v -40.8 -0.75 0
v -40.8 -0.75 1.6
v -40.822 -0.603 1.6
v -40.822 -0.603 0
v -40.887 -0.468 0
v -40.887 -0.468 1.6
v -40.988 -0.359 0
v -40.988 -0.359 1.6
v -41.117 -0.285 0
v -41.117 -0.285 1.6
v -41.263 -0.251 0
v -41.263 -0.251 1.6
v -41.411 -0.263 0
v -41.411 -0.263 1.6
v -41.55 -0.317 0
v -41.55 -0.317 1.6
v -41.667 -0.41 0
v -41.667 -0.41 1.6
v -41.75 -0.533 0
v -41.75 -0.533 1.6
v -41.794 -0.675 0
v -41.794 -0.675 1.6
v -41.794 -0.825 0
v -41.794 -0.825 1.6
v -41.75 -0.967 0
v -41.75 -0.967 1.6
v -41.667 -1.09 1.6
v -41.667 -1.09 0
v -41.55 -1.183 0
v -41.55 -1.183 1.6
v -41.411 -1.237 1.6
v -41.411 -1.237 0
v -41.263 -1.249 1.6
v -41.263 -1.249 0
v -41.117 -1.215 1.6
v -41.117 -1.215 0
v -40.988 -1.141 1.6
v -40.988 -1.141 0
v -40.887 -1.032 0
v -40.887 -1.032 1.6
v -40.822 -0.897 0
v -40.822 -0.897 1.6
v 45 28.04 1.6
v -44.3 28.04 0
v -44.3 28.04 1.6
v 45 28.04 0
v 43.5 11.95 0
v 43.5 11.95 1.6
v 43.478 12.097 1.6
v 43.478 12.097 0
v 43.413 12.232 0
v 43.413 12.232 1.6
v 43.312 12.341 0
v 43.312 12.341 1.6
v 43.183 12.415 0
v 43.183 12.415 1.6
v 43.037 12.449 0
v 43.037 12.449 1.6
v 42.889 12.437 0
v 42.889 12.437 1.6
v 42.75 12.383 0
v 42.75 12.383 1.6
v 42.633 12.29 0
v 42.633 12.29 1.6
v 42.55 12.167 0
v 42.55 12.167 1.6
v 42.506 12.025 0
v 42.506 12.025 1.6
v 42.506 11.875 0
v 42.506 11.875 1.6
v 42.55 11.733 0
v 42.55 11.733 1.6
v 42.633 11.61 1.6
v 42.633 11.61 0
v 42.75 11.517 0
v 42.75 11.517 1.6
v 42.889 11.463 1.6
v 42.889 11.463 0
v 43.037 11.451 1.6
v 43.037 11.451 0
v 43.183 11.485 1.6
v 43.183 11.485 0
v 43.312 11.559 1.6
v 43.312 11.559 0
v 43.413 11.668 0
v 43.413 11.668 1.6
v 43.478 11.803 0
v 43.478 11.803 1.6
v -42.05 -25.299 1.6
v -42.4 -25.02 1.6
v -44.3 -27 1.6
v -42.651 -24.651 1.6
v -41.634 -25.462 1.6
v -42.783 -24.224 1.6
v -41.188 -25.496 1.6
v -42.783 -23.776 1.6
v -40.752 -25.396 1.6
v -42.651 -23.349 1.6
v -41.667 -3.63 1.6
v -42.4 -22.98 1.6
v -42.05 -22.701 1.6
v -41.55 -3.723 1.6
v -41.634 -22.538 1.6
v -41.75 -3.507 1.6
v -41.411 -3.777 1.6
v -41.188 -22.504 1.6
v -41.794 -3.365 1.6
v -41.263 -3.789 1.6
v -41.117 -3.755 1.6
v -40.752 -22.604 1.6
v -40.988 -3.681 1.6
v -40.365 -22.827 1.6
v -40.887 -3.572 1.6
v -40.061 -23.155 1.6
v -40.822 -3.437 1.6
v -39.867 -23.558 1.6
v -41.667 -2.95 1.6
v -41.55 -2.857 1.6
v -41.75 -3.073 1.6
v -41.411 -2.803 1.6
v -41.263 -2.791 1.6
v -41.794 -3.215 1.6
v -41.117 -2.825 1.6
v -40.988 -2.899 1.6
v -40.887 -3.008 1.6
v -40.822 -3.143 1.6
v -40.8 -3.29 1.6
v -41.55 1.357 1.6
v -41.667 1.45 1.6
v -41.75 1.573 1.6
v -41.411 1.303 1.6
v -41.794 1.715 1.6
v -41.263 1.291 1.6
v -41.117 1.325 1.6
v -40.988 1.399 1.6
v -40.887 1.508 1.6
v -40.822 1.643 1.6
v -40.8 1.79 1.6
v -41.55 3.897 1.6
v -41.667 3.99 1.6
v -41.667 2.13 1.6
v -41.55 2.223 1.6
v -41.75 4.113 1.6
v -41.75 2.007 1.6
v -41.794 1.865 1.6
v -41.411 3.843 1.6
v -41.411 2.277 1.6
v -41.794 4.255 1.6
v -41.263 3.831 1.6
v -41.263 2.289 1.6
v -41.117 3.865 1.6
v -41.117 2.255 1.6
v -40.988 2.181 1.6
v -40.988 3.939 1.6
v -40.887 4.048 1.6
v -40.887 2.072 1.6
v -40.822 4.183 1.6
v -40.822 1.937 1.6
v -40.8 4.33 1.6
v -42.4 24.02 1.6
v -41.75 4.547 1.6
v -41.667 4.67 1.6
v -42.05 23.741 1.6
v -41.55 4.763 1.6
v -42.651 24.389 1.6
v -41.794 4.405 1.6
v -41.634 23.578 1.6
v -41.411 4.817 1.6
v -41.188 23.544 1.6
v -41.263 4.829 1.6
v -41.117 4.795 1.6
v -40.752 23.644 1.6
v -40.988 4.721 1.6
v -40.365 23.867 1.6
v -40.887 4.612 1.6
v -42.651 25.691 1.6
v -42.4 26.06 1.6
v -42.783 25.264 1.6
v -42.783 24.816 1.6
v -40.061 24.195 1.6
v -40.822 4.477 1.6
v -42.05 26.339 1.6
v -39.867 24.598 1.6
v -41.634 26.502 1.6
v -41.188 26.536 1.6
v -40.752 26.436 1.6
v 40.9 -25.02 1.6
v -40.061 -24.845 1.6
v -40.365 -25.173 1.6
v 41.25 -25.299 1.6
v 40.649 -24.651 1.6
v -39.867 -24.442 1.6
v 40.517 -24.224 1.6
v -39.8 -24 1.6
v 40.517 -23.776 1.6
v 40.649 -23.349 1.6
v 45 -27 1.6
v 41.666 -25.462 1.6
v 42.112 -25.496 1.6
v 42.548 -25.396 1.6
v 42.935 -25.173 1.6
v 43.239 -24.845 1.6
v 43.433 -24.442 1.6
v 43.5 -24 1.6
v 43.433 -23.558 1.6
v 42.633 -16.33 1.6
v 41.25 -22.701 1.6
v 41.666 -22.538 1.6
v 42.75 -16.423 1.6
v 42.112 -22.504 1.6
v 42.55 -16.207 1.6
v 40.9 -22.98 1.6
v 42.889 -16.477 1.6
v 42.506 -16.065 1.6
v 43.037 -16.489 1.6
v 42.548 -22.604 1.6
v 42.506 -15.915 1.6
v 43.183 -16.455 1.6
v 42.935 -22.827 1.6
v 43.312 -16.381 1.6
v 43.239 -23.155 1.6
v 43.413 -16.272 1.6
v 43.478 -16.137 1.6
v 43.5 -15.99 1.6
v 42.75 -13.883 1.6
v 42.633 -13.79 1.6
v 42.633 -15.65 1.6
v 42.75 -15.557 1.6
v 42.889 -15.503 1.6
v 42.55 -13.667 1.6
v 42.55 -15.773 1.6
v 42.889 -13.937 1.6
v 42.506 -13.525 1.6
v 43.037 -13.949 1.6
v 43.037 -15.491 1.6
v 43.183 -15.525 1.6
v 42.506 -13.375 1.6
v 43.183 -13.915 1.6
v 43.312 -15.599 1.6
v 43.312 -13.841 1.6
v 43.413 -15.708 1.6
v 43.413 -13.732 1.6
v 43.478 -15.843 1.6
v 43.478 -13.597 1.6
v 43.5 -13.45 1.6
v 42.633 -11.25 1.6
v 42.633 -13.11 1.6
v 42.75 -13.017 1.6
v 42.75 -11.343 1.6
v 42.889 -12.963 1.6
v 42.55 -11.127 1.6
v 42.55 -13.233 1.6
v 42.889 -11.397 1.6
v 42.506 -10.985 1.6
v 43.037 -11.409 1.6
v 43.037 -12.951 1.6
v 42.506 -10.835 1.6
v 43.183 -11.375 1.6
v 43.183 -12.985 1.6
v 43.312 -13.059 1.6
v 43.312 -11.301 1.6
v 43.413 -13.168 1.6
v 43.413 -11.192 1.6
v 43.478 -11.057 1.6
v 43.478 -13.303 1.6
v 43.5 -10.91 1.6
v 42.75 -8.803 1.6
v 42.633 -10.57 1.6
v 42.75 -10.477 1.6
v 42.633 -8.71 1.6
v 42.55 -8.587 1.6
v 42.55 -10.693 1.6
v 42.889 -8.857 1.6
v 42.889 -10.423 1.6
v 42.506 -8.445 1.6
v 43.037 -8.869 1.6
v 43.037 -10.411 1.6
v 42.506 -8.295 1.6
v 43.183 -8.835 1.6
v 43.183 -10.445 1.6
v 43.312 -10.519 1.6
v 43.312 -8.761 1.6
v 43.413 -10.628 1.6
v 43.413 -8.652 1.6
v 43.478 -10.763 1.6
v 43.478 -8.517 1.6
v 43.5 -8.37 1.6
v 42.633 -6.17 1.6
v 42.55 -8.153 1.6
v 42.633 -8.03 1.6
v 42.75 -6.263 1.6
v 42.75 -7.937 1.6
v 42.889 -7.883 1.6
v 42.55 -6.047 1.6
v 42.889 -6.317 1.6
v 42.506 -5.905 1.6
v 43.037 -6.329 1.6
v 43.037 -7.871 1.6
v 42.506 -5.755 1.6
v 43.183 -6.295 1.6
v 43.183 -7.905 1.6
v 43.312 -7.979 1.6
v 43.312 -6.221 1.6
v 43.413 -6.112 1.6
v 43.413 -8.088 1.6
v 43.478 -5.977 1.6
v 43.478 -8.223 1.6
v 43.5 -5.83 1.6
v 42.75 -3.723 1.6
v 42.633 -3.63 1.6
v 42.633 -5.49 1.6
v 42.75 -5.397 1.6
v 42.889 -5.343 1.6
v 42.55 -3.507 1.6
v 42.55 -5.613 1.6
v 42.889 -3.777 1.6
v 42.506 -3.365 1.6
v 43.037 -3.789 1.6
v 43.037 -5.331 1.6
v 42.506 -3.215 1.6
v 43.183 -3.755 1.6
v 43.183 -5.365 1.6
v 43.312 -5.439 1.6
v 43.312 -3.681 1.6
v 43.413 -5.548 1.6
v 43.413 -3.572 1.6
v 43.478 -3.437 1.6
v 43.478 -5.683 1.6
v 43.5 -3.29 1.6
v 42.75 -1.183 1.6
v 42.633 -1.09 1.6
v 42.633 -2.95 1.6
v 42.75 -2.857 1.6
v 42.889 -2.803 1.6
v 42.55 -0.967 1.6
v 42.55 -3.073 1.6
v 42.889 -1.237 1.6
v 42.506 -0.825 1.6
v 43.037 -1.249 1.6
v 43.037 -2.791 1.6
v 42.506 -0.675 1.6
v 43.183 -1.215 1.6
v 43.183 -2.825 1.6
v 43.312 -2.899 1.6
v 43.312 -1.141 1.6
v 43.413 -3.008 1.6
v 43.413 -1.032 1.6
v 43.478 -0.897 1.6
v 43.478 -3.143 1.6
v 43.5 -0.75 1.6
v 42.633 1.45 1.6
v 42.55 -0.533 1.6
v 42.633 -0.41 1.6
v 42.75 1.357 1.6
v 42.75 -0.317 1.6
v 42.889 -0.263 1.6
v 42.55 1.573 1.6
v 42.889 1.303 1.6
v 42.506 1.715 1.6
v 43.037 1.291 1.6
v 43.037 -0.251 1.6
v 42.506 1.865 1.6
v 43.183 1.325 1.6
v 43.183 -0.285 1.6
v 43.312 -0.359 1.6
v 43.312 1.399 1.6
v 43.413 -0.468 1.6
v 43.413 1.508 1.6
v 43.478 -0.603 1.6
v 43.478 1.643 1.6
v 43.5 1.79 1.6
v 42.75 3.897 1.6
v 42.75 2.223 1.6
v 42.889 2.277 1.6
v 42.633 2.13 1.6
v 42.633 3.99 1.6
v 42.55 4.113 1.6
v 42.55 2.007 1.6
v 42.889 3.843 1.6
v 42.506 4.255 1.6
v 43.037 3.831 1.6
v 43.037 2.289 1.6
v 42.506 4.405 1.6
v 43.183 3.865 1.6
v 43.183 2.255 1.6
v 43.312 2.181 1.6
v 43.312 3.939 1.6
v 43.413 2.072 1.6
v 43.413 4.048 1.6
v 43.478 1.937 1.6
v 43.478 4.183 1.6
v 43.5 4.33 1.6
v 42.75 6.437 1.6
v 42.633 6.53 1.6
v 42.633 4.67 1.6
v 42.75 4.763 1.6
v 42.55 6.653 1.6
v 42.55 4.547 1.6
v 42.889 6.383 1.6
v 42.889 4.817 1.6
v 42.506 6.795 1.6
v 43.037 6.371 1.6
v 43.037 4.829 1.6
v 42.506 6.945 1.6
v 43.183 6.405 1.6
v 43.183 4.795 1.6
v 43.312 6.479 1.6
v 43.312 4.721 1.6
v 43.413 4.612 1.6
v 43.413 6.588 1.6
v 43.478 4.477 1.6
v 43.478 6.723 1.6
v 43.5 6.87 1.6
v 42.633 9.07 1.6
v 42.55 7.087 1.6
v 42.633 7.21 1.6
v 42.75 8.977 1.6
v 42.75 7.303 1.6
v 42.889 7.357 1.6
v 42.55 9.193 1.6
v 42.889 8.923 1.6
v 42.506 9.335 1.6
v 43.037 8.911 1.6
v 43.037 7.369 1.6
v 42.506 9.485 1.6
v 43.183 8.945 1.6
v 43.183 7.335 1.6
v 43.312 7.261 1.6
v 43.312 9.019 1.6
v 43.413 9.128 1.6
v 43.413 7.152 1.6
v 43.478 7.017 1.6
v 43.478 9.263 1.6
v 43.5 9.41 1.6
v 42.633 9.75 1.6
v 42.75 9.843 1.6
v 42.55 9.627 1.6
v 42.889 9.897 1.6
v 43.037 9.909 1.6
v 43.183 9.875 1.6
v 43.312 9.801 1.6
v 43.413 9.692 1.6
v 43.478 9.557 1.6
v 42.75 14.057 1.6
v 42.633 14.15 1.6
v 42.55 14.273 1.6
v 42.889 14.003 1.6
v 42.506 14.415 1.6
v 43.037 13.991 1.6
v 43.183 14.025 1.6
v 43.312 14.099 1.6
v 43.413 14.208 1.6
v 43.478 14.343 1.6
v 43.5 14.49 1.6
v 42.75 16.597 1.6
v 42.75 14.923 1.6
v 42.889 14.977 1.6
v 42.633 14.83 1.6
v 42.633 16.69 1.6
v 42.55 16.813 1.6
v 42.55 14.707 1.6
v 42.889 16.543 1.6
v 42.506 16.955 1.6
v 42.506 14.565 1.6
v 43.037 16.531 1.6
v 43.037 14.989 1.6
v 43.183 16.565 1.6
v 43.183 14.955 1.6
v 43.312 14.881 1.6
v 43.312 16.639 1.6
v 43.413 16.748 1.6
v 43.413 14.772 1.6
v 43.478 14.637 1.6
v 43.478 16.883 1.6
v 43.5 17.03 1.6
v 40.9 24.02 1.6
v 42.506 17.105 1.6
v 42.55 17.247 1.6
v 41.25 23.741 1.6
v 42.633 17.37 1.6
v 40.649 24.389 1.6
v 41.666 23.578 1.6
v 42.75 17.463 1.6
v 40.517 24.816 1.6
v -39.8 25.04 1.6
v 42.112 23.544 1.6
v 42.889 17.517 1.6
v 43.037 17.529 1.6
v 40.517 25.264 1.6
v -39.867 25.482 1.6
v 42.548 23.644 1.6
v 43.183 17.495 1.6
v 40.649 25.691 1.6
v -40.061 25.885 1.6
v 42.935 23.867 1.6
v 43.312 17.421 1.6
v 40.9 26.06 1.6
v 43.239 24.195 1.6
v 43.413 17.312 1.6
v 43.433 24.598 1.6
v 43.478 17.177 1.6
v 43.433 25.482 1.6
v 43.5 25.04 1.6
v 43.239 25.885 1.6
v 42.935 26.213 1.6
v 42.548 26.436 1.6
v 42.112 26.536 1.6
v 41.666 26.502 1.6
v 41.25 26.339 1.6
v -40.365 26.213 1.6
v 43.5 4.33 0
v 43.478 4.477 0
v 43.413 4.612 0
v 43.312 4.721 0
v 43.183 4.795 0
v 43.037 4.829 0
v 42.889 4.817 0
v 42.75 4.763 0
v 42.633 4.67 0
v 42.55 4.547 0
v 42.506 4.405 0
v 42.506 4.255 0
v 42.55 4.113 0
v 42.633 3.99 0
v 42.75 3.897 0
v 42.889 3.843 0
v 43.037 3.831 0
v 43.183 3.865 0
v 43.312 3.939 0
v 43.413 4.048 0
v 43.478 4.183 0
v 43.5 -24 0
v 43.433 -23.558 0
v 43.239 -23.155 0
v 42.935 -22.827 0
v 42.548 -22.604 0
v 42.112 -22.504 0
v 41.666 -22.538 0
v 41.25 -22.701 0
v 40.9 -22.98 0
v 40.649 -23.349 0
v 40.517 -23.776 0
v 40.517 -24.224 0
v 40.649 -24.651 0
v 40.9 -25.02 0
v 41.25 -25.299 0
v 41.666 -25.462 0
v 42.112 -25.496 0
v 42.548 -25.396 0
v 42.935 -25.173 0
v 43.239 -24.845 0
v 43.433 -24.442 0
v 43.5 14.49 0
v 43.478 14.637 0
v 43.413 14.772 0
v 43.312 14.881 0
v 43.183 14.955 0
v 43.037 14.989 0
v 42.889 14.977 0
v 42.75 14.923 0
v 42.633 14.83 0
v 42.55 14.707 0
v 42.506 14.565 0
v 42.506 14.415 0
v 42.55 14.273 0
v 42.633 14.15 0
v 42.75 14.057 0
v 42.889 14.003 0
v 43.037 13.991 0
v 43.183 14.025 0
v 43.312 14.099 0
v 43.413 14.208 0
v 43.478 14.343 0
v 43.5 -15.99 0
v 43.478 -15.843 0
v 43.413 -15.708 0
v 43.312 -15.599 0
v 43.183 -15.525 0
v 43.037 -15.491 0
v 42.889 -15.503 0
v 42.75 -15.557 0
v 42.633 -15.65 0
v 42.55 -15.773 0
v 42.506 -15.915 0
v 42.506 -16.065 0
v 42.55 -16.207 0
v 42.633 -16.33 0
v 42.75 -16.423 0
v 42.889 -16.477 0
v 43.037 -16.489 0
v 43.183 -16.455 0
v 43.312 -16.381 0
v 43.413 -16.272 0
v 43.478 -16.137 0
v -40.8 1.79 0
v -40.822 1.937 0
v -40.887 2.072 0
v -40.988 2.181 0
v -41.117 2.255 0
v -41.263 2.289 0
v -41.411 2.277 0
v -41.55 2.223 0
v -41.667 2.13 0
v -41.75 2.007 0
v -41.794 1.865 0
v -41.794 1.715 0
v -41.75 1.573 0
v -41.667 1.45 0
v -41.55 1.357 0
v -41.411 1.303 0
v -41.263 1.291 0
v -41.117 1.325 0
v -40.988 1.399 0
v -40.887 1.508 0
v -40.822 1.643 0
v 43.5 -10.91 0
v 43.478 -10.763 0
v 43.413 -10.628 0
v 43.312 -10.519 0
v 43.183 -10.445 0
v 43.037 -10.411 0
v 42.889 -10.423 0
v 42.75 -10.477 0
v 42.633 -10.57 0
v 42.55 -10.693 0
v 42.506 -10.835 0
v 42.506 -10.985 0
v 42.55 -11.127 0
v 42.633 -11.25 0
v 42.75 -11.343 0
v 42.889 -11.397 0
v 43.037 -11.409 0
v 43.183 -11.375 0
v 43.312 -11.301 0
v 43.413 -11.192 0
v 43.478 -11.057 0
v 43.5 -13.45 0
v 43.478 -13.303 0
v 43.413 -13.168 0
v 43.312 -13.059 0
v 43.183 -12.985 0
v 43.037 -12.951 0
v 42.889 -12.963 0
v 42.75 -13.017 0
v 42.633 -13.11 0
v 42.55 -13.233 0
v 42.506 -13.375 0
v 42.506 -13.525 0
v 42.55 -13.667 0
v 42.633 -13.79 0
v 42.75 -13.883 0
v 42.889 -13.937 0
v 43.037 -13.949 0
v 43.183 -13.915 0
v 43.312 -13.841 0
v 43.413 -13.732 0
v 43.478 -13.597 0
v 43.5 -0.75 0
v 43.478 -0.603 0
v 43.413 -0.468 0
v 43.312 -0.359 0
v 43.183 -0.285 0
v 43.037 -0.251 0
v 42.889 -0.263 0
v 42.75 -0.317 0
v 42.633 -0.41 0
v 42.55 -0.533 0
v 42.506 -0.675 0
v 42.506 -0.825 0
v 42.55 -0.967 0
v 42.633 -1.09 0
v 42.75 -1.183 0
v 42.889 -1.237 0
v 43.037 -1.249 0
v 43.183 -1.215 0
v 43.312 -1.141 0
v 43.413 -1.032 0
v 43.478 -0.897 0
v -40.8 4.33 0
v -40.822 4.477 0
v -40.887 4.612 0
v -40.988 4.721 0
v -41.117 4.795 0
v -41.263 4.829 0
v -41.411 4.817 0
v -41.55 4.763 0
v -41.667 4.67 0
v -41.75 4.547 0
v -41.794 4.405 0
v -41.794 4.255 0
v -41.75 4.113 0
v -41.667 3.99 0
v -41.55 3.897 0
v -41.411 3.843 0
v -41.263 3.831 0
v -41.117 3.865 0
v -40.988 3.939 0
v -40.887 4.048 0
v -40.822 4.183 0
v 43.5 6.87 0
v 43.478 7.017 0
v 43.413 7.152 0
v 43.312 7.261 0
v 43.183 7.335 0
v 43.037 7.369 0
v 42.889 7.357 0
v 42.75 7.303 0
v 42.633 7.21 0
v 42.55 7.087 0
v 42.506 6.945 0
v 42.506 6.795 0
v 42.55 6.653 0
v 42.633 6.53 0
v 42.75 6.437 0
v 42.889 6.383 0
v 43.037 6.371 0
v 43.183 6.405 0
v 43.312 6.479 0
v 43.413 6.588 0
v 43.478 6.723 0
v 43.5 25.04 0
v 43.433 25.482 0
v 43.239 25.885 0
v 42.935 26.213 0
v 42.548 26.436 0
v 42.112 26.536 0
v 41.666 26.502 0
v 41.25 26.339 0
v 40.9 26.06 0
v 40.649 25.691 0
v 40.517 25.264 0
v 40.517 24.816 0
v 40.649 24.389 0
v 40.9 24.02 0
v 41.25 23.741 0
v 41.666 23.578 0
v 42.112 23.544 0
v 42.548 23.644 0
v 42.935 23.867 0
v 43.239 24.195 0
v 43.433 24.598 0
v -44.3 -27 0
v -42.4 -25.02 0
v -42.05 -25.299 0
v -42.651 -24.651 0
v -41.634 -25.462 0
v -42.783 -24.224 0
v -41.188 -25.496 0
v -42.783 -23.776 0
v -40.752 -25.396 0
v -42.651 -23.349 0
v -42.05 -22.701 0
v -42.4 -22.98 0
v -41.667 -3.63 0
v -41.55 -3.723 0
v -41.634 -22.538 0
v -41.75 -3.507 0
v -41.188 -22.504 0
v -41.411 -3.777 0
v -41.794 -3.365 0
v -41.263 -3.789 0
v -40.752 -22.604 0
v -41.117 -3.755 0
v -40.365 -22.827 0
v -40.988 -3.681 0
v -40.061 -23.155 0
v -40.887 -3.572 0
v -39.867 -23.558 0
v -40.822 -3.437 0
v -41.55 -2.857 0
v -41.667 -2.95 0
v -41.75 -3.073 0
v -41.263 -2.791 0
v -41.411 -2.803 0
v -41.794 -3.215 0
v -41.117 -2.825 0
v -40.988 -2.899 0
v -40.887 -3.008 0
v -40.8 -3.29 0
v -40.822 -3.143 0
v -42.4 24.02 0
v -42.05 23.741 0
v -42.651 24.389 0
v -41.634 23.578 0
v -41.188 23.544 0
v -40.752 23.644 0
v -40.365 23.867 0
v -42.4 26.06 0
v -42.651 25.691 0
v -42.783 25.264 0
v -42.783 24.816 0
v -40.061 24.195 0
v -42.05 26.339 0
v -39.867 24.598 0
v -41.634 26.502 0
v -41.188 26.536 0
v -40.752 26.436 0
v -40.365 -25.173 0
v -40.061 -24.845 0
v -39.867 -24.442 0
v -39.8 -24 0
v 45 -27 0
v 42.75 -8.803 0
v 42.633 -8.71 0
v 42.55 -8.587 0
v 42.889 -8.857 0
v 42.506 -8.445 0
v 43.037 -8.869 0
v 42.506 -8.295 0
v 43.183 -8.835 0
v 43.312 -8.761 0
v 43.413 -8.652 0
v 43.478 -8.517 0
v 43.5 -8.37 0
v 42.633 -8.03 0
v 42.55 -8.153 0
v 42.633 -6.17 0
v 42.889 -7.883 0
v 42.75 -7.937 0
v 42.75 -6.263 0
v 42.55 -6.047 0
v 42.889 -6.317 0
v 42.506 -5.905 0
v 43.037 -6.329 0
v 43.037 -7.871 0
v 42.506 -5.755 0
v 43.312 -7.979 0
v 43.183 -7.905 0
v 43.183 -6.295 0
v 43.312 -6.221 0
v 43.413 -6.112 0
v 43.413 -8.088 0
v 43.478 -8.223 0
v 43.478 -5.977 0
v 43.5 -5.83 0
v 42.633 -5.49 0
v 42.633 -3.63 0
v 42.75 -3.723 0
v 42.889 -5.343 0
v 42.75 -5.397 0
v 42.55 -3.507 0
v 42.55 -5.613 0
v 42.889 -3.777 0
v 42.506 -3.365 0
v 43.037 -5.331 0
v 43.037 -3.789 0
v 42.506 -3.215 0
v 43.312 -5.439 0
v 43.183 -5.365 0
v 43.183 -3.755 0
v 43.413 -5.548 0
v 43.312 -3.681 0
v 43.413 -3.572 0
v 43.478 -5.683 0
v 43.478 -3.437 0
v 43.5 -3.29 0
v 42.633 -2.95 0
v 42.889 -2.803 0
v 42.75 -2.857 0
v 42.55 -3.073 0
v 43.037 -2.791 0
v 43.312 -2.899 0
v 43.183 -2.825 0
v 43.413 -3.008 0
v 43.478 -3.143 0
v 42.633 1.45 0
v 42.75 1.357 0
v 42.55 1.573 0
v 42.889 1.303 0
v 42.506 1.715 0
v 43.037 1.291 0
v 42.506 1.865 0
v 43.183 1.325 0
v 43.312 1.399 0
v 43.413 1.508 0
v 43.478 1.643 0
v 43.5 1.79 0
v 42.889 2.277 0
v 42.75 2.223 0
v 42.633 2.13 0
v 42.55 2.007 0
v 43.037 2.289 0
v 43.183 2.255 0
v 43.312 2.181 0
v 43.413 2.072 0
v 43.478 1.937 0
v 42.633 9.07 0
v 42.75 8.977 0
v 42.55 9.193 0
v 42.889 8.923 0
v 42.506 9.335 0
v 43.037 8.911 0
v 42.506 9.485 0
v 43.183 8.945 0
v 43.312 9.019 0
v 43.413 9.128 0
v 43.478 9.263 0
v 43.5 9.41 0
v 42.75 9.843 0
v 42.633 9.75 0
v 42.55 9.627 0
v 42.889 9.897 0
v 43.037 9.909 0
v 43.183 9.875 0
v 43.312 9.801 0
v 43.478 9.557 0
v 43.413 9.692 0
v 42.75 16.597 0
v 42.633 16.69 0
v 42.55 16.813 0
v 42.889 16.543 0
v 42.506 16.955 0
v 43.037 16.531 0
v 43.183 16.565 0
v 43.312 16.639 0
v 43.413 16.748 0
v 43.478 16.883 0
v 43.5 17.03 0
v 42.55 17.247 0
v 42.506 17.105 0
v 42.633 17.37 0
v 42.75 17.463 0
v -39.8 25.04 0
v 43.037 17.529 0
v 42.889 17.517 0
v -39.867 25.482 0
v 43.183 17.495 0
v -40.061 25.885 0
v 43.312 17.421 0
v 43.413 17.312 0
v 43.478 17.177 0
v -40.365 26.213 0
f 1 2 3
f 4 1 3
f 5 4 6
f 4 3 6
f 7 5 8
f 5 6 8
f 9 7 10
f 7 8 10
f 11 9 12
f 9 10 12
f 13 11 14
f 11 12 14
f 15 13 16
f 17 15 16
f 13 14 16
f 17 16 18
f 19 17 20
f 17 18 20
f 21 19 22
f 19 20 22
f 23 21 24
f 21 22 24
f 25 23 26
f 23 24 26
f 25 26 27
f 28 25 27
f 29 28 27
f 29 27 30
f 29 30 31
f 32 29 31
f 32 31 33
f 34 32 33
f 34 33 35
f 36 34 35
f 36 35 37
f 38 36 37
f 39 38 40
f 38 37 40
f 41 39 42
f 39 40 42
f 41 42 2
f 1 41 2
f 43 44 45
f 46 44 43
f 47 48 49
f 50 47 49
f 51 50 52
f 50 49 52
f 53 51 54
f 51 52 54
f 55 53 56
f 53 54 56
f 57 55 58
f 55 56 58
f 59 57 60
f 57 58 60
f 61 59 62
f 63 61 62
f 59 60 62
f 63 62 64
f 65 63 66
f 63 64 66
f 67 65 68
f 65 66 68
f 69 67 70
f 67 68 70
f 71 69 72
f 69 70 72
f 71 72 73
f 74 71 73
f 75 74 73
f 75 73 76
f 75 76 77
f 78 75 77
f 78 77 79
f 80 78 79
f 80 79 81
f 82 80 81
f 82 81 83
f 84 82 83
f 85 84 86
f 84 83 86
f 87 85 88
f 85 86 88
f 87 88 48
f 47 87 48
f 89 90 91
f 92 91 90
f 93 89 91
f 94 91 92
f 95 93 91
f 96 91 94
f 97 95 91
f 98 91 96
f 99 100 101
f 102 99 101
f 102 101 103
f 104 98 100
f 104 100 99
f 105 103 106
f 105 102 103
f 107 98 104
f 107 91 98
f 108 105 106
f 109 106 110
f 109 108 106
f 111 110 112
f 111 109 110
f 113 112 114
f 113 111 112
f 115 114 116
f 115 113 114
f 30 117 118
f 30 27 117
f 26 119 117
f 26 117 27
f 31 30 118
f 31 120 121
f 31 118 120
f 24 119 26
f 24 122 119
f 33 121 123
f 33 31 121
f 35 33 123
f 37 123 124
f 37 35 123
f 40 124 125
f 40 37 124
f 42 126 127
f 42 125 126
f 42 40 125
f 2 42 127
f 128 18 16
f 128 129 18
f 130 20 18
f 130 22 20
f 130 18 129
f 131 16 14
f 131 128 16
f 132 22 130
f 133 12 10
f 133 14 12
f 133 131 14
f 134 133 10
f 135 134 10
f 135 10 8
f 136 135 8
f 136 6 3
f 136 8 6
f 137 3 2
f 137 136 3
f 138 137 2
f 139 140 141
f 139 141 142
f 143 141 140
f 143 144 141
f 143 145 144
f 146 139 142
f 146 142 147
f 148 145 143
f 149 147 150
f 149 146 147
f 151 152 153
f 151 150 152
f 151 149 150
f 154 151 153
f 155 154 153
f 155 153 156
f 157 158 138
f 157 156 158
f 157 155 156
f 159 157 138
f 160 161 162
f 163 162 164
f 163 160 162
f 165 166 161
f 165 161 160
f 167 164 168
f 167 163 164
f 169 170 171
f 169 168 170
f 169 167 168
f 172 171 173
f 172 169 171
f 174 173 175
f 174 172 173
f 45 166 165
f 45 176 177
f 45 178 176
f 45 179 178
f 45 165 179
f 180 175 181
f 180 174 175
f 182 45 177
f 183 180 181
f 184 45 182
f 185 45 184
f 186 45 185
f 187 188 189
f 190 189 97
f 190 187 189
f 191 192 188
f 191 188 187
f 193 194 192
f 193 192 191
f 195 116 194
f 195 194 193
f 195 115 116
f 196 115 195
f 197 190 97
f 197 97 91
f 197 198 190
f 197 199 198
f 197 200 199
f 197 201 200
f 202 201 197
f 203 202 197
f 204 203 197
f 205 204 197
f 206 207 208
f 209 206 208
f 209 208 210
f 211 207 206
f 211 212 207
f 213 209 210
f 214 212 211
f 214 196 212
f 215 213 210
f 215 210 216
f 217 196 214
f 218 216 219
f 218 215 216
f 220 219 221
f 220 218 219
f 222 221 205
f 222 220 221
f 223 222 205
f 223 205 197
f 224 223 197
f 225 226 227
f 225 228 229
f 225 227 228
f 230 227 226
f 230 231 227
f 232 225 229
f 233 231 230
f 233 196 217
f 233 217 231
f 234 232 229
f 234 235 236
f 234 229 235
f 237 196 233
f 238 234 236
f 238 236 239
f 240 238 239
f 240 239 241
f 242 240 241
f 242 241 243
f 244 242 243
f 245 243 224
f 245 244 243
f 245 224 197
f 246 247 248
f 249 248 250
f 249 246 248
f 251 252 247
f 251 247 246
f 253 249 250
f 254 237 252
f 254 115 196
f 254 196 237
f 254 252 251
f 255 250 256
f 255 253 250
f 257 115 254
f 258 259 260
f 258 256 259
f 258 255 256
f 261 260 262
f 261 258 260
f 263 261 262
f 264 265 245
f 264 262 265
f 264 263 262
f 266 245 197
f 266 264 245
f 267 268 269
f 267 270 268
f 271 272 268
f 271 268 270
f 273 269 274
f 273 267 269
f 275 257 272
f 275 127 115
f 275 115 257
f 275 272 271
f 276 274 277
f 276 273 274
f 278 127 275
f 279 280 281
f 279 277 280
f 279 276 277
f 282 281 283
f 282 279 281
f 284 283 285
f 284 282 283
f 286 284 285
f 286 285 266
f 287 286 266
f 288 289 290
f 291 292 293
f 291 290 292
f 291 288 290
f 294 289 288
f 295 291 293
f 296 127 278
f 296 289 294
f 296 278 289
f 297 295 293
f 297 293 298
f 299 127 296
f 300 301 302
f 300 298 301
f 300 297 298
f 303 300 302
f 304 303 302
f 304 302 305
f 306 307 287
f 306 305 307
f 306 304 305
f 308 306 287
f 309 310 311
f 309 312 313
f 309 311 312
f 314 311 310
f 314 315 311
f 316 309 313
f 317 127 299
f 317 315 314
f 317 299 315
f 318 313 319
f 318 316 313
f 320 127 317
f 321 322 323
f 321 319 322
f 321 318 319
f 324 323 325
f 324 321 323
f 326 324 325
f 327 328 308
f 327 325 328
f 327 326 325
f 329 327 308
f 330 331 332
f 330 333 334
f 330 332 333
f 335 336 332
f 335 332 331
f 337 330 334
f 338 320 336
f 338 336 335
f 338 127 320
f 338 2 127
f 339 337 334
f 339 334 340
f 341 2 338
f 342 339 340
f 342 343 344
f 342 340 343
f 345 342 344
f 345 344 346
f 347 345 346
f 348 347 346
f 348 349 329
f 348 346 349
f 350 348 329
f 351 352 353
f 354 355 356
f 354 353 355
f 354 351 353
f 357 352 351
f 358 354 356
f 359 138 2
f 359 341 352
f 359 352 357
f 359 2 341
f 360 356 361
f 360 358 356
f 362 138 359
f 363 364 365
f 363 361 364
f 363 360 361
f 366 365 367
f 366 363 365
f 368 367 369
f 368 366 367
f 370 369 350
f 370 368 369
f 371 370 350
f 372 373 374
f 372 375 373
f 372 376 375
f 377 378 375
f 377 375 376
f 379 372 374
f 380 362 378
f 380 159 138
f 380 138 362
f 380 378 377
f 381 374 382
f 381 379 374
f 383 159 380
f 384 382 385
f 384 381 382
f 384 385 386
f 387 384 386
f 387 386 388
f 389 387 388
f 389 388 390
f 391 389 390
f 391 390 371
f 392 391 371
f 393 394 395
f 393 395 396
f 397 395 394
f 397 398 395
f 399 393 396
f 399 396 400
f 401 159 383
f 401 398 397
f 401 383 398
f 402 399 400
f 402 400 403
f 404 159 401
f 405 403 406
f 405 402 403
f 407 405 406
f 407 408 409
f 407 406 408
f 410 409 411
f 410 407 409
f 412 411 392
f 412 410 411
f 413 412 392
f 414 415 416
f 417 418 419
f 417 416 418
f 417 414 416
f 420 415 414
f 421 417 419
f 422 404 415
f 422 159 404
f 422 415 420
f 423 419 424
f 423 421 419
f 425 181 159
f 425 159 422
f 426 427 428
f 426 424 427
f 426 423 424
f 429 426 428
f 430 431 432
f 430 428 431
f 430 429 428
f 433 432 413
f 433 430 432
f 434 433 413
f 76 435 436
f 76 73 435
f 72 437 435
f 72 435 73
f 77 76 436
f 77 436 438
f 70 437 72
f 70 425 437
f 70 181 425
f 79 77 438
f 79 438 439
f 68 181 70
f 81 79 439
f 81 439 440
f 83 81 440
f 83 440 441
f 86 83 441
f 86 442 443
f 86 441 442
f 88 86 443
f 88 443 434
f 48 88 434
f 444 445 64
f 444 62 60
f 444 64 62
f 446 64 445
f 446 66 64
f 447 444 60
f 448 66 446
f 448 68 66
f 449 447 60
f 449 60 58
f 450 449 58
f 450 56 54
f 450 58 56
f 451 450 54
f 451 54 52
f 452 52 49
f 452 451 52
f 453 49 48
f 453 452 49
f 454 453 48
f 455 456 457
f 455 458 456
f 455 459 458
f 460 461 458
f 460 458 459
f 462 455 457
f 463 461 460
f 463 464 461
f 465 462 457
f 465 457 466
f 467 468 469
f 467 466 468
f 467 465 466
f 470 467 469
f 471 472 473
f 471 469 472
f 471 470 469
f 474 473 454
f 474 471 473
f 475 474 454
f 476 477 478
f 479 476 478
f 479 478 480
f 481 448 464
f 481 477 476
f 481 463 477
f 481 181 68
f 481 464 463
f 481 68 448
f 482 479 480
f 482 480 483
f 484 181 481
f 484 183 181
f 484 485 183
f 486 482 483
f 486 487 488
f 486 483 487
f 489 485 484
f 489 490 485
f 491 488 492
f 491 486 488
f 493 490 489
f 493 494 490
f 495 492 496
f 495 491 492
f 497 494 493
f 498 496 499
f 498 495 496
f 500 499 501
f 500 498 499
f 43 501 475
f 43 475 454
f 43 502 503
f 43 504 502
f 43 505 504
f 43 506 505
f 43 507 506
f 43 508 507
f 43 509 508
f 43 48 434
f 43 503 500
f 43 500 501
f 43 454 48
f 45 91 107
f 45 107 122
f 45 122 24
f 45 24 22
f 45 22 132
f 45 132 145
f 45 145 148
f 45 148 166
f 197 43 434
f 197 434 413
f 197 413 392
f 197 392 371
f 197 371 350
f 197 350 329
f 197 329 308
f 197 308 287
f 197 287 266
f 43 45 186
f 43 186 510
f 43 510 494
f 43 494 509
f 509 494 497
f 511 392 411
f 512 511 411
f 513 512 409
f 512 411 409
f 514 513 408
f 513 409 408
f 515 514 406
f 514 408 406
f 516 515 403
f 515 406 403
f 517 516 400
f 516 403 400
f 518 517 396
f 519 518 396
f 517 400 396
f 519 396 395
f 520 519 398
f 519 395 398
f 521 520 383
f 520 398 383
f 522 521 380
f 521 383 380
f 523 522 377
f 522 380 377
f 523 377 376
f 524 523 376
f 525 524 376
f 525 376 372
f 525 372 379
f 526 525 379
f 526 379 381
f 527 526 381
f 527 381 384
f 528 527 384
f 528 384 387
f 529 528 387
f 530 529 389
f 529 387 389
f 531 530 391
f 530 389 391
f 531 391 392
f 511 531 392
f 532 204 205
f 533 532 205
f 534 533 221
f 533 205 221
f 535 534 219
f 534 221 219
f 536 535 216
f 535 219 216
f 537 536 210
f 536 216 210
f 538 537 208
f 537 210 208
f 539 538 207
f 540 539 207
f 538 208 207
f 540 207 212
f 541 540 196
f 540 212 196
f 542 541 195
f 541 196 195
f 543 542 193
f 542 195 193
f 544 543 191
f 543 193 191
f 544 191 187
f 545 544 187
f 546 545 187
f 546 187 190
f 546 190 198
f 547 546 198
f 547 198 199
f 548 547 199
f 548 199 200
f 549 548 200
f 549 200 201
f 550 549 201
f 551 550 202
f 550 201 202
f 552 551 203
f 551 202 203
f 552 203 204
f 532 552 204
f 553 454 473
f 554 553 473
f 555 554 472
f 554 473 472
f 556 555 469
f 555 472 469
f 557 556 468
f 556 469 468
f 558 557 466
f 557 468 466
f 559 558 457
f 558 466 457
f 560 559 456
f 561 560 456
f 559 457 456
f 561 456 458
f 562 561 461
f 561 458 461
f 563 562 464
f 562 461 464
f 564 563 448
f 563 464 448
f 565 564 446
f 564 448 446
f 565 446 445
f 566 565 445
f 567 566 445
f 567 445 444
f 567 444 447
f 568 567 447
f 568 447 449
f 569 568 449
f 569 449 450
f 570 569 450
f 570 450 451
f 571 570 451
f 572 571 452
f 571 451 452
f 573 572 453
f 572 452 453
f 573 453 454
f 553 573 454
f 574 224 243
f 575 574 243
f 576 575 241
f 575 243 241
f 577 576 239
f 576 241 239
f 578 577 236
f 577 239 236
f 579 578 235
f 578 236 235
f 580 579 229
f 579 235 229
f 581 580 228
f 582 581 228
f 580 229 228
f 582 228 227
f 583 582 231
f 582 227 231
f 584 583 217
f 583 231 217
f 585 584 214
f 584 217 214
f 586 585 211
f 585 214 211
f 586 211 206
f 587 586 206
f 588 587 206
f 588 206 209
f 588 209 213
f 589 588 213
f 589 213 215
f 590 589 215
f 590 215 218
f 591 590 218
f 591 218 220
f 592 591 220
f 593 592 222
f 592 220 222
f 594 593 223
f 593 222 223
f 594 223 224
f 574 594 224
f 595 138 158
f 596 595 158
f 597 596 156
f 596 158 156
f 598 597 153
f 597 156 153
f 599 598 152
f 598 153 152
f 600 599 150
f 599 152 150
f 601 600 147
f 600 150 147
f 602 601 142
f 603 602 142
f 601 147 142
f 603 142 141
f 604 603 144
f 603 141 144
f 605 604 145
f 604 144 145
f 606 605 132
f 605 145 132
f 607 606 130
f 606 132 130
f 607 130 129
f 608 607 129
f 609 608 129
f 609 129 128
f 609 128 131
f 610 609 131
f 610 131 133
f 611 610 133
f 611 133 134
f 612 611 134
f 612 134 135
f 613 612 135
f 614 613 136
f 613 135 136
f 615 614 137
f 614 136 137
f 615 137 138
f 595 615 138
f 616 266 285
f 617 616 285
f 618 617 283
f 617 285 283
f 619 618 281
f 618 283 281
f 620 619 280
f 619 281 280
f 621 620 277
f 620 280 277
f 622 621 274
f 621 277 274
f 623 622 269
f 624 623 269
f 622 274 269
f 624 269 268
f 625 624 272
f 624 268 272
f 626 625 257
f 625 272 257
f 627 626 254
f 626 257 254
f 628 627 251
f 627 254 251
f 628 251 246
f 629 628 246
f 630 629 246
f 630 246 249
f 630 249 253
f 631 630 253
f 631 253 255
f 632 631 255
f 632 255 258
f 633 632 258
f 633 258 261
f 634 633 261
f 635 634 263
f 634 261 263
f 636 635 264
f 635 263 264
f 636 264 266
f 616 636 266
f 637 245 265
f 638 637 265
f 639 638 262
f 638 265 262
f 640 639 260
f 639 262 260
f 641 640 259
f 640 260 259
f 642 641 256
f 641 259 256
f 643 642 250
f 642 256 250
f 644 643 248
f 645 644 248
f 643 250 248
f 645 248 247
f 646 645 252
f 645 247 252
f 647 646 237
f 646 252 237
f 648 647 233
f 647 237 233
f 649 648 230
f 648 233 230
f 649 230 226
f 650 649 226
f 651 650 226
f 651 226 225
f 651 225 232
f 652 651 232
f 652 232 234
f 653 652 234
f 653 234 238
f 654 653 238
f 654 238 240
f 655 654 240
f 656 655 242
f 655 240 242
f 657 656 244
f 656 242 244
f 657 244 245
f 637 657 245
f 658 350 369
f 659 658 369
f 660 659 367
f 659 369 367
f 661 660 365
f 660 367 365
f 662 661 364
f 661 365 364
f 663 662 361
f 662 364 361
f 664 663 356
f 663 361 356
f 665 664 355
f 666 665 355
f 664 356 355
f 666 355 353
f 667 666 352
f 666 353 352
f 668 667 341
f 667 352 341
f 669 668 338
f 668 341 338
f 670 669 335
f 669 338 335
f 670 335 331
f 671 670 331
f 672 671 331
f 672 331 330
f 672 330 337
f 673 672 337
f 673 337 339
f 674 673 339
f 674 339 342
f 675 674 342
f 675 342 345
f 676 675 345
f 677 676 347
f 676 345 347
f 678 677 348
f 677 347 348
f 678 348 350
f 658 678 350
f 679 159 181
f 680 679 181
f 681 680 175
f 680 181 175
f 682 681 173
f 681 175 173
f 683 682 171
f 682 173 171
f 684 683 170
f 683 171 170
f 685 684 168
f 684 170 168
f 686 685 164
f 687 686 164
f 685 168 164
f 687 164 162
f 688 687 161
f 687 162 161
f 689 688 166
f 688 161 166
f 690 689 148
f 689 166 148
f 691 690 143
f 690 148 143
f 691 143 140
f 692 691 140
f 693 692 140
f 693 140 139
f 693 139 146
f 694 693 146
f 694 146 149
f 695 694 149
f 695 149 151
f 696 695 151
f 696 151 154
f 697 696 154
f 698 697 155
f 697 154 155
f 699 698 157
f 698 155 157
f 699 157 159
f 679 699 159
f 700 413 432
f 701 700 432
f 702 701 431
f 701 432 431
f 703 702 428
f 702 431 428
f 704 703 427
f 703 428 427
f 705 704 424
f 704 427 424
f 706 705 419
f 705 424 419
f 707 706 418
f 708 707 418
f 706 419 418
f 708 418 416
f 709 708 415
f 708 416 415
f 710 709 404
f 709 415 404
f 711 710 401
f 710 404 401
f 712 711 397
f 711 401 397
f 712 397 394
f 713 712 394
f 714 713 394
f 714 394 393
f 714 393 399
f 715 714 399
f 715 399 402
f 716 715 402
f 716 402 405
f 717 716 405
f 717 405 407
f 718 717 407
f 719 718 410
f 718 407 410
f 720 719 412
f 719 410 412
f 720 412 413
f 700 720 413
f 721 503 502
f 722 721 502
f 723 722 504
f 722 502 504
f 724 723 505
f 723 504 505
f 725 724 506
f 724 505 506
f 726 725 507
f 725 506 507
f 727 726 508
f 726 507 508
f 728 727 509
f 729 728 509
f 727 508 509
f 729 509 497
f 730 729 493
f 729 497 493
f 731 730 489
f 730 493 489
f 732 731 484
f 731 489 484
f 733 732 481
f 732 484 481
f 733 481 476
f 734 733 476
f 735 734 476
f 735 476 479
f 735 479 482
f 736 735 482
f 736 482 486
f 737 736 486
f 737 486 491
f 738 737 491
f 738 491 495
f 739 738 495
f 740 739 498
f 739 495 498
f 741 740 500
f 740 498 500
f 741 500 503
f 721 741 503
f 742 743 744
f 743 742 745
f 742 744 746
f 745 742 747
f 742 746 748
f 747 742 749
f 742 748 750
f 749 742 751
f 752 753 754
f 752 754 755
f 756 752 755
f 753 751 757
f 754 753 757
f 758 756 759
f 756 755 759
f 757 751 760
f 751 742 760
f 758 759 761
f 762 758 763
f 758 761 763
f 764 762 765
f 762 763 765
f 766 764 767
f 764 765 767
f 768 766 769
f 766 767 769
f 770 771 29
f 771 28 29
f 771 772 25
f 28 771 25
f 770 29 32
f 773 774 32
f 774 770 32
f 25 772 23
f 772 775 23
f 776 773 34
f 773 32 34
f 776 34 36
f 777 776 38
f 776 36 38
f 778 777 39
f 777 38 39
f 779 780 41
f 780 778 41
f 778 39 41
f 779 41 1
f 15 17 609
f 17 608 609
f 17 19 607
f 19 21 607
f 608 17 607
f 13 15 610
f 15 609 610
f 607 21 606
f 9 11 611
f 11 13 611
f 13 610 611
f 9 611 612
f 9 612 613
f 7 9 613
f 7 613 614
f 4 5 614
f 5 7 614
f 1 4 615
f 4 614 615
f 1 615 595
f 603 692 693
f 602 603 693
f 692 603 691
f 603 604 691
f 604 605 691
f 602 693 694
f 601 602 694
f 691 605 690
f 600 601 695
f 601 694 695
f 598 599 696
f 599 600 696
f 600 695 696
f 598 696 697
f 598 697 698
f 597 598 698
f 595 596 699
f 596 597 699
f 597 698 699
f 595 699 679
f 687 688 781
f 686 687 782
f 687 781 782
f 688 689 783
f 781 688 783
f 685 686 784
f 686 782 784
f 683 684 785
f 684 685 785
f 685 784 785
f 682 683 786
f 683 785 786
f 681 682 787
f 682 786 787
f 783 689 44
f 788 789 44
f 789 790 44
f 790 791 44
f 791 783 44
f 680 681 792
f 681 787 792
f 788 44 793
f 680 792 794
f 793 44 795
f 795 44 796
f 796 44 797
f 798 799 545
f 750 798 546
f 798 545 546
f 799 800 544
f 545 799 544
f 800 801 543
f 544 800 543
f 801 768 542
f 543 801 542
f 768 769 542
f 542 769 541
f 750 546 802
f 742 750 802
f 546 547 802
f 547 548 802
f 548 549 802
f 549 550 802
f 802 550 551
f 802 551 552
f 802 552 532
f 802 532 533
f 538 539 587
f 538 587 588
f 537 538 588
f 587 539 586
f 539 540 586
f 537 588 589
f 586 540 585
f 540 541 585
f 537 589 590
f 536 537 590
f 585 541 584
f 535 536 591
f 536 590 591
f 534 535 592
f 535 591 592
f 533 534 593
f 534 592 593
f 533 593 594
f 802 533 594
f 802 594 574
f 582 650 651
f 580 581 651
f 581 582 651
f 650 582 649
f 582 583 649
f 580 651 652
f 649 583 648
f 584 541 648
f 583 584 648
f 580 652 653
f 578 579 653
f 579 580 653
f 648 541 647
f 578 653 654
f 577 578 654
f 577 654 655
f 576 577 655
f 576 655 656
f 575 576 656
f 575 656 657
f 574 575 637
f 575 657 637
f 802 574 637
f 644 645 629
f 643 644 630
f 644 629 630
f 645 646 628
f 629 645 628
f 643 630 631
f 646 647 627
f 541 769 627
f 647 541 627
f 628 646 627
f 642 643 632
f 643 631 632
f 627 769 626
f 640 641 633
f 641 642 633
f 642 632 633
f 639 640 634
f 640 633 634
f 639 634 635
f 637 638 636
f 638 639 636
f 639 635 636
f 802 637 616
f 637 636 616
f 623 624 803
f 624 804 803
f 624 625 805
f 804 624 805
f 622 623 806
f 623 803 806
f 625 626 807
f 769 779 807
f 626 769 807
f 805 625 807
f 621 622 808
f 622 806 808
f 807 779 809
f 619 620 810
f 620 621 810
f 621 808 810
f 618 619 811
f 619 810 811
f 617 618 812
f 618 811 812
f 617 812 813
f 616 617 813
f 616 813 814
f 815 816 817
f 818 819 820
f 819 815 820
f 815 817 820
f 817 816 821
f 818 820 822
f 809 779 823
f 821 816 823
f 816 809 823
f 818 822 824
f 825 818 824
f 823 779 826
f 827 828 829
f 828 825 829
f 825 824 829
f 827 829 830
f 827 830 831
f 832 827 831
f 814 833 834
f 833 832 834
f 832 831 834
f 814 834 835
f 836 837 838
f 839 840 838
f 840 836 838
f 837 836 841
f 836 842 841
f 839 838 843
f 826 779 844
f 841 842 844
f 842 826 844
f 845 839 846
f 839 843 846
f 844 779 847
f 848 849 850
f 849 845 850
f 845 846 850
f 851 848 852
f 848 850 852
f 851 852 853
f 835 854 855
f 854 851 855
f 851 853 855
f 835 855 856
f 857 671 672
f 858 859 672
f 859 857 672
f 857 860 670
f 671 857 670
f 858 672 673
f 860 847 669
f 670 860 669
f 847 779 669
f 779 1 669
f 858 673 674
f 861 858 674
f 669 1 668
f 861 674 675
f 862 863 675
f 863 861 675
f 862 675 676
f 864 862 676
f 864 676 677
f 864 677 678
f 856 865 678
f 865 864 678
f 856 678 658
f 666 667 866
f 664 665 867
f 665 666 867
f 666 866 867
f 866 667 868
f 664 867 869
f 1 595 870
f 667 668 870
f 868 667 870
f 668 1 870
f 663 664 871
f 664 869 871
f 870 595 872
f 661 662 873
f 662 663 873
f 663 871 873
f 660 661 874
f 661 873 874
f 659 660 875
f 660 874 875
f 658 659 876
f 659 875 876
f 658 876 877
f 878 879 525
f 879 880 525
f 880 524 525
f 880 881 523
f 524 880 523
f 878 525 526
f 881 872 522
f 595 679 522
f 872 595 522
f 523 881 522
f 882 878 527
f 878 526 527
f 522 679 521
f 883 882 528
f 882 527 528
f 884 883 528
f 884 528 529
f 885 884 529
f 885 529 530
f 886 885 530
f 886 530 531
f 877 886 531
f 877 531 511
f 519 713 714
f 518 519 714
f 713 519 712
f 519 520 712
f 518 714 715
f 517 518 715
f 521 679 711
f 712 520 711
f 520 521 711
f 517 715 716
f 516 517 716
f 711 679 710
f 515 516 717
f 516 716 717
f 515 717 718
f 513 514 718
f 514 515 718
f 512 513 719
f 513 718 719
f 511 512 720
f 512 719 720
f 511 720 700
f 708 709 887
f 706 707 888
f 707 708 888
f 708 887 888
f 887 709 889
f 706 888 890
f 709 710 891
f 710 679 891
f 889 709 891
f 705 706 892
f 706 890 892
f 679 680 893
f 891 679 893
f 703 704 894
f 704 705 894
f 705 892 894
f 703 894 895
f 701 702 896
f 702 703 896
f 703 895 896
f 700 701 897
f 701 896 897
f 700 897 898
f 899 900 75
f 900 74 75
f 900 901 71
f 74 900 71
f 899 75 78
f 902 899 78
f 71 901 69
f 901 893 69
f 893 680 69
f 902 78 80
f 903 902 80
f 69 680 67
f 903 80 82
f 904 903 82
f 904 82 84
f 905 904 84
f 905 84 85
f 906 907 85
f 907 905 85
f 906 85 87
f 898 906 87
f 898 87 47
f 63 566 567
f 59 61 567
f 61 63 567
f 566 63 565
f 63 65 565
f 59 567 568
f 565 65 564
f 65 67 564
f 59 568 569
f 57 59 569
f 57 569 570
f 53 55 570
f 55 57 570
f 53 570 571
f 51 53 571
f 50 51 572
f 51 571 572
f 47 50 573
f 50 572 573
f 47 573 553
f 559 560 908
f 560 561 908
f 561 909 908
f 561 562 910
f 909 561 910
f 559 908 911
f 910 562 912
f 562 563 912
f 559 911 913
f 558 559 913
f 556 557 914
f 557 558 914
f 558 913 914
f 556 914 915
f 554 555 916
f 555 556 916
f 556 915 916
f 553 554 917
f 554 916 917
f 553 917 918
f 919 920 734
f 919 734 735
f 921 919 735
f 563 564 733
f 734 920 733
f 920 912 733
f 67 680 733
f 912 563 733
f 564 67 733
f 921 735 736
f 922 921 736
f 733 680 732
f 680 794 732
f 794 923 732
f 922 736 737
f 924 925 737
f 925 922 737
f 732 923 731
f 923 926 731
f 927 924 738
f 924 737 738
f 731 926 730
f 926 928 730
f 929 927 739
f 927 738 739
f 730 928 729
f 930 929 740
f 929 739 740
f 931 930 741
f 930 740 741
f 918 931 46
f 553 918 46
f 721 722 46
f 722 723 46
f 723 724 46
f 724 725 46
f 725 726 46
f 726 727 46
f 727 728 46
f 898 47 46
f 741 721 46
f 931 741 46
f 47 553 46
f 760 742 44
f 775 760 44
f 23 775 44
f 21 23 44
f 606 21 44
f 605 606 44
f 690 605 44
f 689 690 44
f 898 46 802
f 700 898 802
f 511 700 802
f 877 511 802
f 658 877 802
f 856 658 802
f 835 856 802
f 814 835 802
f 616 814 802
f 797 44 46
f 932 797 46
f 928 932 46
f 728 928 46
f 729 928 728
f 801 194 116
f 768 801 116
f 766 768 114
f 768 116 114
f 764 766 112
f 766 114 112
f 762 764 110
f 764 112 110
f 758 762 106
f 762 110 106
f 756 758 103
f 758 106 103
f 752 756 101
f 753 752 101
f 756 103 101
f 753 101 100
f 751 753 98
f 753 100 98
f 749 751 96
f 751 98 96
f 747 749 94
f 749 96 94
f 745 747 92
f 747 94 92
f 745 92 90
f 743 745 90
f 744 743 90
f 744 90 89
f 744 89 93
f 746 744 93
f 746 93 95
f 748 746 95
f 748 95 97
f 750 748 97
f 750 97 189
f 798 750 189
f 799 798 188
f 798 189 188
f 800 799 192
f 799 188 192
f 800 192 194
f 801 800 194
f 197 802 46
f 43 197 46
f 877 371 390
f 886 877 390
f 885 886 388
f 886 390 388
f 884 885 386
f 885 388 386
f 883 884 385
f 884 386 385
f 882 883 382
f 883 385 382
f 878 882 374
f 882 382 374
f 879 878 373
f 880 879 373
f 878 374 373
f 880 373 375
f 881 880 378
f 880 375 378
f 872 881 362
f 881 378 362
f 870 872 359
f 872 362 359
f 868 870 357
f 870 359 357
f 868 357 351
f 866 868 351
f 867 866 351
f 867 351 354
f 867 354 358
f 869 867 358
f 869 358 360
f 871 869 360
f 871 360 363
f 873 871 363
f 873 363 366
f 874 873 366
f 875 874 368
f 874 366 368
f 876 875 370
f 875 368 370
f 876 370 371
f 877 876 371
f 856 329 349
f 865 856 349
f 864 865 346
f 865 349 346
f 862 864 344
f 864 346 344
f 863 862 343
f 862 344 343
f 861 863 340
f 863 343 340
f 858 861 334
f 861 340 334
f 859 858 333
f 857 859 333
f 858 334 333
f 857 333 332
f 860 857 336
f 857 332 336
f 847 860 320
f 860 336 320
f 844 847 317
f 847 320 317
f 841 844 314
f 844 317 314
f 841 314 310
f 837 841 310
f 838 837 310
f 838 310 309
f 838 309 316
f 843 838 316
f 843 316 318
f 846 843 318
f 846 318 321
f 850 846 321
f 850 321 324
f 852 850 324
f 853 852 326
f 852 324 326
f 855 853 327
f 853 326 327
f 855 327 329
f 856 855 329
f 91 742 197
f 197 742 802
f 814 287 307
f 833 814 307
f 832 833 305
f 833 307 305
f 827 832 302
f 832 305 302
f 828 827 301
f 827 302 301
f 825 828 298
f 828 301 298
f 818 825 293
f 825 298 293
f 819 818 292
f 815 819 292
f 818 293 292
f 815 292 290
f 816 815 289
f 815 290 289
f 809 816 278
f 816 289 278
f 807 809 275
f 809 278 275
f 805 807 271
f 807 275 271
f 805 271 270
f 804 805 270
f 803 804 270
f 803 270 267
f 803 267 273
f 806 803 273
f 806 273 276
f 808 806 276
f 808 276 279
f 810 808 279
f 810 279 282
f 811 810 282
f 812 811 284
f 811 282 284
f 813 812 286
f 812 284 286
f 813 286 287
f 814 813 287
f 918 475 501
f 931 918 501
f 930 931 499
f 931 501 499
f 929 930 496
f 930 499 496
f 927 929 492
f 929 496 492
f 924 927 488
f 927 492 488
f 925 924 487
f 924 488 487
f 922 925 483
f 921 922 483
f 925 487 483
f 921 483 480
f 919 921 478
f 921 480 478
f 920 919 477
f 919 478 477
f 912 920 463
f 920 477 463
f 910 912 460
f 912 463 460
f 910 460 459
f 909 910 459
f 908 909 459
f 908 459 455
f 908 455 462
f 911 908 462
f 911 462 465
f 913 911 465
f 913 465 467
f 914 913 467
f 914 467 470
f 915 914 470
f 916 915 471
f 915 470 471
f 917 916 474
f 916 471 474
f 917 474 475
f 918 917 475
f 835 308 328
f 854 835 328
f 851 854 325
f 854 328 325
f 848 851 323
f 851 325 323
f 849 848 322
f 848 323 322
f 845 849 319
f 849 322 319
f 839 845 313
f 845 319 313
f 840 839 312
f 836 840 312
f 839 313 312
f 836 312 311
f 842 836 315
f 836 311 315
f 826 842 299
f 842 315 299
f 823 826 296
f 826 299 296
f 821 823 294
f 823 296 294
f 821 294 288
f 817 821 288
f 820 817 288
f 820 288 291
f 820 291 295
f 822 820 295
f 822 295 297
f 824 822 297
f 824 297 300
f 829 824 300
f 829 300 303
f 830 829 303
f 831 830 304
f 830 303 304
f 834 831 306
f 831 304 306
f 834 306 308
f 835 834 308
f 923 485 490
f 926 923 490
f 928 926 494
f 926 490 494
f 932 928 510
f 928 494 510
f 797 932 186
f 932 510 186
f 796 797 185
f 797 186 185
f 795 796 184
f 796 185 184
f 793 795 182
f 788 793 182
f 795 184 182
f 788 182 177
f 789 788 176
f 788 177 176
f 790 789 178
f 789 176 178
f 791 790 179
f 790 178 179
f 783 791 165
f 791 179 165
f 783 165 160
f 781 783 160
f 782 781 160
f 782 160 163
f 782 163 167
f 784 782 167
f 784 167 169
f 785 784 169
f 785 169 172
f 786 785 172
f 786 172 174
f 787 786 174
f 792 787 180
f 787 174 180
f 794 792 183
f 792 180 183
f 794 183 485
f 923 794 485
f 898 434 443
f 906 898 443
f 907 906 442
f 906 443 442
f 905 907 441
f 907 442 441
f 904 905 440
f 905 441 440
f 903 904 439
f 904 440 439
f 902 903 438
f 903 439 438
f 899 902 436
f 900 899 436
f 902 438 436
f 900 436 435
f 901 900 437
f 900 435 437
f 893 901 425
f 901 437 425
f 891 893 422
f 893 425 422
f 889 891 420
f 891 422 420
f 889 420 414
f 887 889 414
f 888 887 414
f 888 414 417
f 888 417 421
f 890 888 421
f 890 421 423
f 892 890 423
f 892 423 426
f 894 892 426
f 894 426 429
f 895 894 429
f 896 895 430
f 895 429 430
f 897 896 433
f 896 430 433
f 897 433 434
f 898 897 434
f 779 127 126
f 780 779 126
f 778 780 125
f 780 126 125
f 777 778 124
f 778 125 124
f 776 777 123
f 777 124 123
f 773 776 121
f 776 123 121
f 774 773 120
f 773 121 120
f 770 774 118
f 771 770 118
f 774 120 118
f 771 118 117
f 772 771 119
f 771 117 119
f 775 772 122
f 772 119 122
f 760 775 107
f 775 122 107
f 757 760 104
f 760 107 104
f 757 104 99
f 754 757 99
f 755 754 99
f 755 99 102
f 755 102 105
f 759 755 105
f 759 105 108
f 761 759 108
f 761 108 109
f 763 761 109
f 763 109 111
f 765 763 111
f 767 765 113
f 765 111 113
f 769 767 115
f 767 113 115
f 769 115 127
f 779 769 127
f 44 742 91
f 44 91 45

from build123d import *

# Parameters (mm, degrees)
SKIZZE1_W                       = 89.3
SKIZZE1_H                       = 55.04
AUFSATZ_LINEAR_AUSTRAGEN1_DEPTH = 1.6
SKIZZE2_R                       = 1.5
SKIZZE2_R_2                     = 0.5
SCHNITT_LINEAR_AUSTRAGEN1_DEPTH = 1.6


with BuildPart() as part:
    # Skizze1 → Aufsatz-Linear austragen1 (new body)
    with BuildSketch(Plane.XY):
        with Locations((0.35, 0.52)):
            Rectangle(SKIZZE1_W, SKIZZE1_H)
    extrude(amount=AUFSATZ_LINEAR_AUSTRAGEN1_DEPTH)

    # Skizze2 → Schnitt-Linear austragen1 (cut)
    with BuildSketch(Plane.XY.offset(1.6)):
        with Locations((-41.3, 25.04)):
            Circle(SKIZZE2_R)
        with Locations((-41.3, -24)):
            Circle(SKIZZE2_R)
        with Locations((42, 25.04)):
            Circle(SKIZZE2_R)
        with Locations((42, -24)):
            Circle(SKIZZE2_R)
        with Locations((43, 17.03)):
            Circle(SKIZZE2_R_2)
        with Locations((43, 14.49)):
            Circle(SKIZZE2_R_2)
        with Locations((43, 11.95)):
            Circle(SKIZZE2_R_2)
        with Locations((43, 9.41)):
            Circle(SKIZZE2_R_2)
        with Locations((43, 6.87)):
            Circle(SKIZZE2_R_2)
        with Locations((43, 4.33)):
            Circle(SKIZZE2_R_2)
        with Locations((43, 1.79)):
            Circle(SKIZZE2_R_2)
        with Locations((43, -0.75)):
            Circle(SKIZZE2_R_2)
        with Locations((43, -3.29)):
            Circle(SKIZZE2_R_2)
        with Locations((43, -5.83)):
            Circle(SKIZZE2_R_2)
        with Locations((43, -8.37)):
            Circle(SKIZZE2_R_2)
        with Locations((43, -10.91)):
            Circle(SKIZZE2_R_2)
        with Locations((43, -13.45)):
            Circle(SKIZZE2_R_2)
        with Locations((-41.3, 4.33)):
            Circle(SKIZZE2_R_2)
        with Locations((-41.3, 1.79)):
            Circle(SKIZZE2_R_2)
        with Locations((-41.3, -0.75)):
            Circle(SKIZZE2_R_2)
        with Locations((43, -15.99)):
            Circle(SKIZZE2_R_2)
        with Locations((-41.3, -3.29)):
            Circle(SKIZZE2_R_2)
    extrude(amount=-SCHNITT_LINEAR_AUSTRAGEN1_DEPTH, mode=Mode.SUBTRACT)


solid = part.part
